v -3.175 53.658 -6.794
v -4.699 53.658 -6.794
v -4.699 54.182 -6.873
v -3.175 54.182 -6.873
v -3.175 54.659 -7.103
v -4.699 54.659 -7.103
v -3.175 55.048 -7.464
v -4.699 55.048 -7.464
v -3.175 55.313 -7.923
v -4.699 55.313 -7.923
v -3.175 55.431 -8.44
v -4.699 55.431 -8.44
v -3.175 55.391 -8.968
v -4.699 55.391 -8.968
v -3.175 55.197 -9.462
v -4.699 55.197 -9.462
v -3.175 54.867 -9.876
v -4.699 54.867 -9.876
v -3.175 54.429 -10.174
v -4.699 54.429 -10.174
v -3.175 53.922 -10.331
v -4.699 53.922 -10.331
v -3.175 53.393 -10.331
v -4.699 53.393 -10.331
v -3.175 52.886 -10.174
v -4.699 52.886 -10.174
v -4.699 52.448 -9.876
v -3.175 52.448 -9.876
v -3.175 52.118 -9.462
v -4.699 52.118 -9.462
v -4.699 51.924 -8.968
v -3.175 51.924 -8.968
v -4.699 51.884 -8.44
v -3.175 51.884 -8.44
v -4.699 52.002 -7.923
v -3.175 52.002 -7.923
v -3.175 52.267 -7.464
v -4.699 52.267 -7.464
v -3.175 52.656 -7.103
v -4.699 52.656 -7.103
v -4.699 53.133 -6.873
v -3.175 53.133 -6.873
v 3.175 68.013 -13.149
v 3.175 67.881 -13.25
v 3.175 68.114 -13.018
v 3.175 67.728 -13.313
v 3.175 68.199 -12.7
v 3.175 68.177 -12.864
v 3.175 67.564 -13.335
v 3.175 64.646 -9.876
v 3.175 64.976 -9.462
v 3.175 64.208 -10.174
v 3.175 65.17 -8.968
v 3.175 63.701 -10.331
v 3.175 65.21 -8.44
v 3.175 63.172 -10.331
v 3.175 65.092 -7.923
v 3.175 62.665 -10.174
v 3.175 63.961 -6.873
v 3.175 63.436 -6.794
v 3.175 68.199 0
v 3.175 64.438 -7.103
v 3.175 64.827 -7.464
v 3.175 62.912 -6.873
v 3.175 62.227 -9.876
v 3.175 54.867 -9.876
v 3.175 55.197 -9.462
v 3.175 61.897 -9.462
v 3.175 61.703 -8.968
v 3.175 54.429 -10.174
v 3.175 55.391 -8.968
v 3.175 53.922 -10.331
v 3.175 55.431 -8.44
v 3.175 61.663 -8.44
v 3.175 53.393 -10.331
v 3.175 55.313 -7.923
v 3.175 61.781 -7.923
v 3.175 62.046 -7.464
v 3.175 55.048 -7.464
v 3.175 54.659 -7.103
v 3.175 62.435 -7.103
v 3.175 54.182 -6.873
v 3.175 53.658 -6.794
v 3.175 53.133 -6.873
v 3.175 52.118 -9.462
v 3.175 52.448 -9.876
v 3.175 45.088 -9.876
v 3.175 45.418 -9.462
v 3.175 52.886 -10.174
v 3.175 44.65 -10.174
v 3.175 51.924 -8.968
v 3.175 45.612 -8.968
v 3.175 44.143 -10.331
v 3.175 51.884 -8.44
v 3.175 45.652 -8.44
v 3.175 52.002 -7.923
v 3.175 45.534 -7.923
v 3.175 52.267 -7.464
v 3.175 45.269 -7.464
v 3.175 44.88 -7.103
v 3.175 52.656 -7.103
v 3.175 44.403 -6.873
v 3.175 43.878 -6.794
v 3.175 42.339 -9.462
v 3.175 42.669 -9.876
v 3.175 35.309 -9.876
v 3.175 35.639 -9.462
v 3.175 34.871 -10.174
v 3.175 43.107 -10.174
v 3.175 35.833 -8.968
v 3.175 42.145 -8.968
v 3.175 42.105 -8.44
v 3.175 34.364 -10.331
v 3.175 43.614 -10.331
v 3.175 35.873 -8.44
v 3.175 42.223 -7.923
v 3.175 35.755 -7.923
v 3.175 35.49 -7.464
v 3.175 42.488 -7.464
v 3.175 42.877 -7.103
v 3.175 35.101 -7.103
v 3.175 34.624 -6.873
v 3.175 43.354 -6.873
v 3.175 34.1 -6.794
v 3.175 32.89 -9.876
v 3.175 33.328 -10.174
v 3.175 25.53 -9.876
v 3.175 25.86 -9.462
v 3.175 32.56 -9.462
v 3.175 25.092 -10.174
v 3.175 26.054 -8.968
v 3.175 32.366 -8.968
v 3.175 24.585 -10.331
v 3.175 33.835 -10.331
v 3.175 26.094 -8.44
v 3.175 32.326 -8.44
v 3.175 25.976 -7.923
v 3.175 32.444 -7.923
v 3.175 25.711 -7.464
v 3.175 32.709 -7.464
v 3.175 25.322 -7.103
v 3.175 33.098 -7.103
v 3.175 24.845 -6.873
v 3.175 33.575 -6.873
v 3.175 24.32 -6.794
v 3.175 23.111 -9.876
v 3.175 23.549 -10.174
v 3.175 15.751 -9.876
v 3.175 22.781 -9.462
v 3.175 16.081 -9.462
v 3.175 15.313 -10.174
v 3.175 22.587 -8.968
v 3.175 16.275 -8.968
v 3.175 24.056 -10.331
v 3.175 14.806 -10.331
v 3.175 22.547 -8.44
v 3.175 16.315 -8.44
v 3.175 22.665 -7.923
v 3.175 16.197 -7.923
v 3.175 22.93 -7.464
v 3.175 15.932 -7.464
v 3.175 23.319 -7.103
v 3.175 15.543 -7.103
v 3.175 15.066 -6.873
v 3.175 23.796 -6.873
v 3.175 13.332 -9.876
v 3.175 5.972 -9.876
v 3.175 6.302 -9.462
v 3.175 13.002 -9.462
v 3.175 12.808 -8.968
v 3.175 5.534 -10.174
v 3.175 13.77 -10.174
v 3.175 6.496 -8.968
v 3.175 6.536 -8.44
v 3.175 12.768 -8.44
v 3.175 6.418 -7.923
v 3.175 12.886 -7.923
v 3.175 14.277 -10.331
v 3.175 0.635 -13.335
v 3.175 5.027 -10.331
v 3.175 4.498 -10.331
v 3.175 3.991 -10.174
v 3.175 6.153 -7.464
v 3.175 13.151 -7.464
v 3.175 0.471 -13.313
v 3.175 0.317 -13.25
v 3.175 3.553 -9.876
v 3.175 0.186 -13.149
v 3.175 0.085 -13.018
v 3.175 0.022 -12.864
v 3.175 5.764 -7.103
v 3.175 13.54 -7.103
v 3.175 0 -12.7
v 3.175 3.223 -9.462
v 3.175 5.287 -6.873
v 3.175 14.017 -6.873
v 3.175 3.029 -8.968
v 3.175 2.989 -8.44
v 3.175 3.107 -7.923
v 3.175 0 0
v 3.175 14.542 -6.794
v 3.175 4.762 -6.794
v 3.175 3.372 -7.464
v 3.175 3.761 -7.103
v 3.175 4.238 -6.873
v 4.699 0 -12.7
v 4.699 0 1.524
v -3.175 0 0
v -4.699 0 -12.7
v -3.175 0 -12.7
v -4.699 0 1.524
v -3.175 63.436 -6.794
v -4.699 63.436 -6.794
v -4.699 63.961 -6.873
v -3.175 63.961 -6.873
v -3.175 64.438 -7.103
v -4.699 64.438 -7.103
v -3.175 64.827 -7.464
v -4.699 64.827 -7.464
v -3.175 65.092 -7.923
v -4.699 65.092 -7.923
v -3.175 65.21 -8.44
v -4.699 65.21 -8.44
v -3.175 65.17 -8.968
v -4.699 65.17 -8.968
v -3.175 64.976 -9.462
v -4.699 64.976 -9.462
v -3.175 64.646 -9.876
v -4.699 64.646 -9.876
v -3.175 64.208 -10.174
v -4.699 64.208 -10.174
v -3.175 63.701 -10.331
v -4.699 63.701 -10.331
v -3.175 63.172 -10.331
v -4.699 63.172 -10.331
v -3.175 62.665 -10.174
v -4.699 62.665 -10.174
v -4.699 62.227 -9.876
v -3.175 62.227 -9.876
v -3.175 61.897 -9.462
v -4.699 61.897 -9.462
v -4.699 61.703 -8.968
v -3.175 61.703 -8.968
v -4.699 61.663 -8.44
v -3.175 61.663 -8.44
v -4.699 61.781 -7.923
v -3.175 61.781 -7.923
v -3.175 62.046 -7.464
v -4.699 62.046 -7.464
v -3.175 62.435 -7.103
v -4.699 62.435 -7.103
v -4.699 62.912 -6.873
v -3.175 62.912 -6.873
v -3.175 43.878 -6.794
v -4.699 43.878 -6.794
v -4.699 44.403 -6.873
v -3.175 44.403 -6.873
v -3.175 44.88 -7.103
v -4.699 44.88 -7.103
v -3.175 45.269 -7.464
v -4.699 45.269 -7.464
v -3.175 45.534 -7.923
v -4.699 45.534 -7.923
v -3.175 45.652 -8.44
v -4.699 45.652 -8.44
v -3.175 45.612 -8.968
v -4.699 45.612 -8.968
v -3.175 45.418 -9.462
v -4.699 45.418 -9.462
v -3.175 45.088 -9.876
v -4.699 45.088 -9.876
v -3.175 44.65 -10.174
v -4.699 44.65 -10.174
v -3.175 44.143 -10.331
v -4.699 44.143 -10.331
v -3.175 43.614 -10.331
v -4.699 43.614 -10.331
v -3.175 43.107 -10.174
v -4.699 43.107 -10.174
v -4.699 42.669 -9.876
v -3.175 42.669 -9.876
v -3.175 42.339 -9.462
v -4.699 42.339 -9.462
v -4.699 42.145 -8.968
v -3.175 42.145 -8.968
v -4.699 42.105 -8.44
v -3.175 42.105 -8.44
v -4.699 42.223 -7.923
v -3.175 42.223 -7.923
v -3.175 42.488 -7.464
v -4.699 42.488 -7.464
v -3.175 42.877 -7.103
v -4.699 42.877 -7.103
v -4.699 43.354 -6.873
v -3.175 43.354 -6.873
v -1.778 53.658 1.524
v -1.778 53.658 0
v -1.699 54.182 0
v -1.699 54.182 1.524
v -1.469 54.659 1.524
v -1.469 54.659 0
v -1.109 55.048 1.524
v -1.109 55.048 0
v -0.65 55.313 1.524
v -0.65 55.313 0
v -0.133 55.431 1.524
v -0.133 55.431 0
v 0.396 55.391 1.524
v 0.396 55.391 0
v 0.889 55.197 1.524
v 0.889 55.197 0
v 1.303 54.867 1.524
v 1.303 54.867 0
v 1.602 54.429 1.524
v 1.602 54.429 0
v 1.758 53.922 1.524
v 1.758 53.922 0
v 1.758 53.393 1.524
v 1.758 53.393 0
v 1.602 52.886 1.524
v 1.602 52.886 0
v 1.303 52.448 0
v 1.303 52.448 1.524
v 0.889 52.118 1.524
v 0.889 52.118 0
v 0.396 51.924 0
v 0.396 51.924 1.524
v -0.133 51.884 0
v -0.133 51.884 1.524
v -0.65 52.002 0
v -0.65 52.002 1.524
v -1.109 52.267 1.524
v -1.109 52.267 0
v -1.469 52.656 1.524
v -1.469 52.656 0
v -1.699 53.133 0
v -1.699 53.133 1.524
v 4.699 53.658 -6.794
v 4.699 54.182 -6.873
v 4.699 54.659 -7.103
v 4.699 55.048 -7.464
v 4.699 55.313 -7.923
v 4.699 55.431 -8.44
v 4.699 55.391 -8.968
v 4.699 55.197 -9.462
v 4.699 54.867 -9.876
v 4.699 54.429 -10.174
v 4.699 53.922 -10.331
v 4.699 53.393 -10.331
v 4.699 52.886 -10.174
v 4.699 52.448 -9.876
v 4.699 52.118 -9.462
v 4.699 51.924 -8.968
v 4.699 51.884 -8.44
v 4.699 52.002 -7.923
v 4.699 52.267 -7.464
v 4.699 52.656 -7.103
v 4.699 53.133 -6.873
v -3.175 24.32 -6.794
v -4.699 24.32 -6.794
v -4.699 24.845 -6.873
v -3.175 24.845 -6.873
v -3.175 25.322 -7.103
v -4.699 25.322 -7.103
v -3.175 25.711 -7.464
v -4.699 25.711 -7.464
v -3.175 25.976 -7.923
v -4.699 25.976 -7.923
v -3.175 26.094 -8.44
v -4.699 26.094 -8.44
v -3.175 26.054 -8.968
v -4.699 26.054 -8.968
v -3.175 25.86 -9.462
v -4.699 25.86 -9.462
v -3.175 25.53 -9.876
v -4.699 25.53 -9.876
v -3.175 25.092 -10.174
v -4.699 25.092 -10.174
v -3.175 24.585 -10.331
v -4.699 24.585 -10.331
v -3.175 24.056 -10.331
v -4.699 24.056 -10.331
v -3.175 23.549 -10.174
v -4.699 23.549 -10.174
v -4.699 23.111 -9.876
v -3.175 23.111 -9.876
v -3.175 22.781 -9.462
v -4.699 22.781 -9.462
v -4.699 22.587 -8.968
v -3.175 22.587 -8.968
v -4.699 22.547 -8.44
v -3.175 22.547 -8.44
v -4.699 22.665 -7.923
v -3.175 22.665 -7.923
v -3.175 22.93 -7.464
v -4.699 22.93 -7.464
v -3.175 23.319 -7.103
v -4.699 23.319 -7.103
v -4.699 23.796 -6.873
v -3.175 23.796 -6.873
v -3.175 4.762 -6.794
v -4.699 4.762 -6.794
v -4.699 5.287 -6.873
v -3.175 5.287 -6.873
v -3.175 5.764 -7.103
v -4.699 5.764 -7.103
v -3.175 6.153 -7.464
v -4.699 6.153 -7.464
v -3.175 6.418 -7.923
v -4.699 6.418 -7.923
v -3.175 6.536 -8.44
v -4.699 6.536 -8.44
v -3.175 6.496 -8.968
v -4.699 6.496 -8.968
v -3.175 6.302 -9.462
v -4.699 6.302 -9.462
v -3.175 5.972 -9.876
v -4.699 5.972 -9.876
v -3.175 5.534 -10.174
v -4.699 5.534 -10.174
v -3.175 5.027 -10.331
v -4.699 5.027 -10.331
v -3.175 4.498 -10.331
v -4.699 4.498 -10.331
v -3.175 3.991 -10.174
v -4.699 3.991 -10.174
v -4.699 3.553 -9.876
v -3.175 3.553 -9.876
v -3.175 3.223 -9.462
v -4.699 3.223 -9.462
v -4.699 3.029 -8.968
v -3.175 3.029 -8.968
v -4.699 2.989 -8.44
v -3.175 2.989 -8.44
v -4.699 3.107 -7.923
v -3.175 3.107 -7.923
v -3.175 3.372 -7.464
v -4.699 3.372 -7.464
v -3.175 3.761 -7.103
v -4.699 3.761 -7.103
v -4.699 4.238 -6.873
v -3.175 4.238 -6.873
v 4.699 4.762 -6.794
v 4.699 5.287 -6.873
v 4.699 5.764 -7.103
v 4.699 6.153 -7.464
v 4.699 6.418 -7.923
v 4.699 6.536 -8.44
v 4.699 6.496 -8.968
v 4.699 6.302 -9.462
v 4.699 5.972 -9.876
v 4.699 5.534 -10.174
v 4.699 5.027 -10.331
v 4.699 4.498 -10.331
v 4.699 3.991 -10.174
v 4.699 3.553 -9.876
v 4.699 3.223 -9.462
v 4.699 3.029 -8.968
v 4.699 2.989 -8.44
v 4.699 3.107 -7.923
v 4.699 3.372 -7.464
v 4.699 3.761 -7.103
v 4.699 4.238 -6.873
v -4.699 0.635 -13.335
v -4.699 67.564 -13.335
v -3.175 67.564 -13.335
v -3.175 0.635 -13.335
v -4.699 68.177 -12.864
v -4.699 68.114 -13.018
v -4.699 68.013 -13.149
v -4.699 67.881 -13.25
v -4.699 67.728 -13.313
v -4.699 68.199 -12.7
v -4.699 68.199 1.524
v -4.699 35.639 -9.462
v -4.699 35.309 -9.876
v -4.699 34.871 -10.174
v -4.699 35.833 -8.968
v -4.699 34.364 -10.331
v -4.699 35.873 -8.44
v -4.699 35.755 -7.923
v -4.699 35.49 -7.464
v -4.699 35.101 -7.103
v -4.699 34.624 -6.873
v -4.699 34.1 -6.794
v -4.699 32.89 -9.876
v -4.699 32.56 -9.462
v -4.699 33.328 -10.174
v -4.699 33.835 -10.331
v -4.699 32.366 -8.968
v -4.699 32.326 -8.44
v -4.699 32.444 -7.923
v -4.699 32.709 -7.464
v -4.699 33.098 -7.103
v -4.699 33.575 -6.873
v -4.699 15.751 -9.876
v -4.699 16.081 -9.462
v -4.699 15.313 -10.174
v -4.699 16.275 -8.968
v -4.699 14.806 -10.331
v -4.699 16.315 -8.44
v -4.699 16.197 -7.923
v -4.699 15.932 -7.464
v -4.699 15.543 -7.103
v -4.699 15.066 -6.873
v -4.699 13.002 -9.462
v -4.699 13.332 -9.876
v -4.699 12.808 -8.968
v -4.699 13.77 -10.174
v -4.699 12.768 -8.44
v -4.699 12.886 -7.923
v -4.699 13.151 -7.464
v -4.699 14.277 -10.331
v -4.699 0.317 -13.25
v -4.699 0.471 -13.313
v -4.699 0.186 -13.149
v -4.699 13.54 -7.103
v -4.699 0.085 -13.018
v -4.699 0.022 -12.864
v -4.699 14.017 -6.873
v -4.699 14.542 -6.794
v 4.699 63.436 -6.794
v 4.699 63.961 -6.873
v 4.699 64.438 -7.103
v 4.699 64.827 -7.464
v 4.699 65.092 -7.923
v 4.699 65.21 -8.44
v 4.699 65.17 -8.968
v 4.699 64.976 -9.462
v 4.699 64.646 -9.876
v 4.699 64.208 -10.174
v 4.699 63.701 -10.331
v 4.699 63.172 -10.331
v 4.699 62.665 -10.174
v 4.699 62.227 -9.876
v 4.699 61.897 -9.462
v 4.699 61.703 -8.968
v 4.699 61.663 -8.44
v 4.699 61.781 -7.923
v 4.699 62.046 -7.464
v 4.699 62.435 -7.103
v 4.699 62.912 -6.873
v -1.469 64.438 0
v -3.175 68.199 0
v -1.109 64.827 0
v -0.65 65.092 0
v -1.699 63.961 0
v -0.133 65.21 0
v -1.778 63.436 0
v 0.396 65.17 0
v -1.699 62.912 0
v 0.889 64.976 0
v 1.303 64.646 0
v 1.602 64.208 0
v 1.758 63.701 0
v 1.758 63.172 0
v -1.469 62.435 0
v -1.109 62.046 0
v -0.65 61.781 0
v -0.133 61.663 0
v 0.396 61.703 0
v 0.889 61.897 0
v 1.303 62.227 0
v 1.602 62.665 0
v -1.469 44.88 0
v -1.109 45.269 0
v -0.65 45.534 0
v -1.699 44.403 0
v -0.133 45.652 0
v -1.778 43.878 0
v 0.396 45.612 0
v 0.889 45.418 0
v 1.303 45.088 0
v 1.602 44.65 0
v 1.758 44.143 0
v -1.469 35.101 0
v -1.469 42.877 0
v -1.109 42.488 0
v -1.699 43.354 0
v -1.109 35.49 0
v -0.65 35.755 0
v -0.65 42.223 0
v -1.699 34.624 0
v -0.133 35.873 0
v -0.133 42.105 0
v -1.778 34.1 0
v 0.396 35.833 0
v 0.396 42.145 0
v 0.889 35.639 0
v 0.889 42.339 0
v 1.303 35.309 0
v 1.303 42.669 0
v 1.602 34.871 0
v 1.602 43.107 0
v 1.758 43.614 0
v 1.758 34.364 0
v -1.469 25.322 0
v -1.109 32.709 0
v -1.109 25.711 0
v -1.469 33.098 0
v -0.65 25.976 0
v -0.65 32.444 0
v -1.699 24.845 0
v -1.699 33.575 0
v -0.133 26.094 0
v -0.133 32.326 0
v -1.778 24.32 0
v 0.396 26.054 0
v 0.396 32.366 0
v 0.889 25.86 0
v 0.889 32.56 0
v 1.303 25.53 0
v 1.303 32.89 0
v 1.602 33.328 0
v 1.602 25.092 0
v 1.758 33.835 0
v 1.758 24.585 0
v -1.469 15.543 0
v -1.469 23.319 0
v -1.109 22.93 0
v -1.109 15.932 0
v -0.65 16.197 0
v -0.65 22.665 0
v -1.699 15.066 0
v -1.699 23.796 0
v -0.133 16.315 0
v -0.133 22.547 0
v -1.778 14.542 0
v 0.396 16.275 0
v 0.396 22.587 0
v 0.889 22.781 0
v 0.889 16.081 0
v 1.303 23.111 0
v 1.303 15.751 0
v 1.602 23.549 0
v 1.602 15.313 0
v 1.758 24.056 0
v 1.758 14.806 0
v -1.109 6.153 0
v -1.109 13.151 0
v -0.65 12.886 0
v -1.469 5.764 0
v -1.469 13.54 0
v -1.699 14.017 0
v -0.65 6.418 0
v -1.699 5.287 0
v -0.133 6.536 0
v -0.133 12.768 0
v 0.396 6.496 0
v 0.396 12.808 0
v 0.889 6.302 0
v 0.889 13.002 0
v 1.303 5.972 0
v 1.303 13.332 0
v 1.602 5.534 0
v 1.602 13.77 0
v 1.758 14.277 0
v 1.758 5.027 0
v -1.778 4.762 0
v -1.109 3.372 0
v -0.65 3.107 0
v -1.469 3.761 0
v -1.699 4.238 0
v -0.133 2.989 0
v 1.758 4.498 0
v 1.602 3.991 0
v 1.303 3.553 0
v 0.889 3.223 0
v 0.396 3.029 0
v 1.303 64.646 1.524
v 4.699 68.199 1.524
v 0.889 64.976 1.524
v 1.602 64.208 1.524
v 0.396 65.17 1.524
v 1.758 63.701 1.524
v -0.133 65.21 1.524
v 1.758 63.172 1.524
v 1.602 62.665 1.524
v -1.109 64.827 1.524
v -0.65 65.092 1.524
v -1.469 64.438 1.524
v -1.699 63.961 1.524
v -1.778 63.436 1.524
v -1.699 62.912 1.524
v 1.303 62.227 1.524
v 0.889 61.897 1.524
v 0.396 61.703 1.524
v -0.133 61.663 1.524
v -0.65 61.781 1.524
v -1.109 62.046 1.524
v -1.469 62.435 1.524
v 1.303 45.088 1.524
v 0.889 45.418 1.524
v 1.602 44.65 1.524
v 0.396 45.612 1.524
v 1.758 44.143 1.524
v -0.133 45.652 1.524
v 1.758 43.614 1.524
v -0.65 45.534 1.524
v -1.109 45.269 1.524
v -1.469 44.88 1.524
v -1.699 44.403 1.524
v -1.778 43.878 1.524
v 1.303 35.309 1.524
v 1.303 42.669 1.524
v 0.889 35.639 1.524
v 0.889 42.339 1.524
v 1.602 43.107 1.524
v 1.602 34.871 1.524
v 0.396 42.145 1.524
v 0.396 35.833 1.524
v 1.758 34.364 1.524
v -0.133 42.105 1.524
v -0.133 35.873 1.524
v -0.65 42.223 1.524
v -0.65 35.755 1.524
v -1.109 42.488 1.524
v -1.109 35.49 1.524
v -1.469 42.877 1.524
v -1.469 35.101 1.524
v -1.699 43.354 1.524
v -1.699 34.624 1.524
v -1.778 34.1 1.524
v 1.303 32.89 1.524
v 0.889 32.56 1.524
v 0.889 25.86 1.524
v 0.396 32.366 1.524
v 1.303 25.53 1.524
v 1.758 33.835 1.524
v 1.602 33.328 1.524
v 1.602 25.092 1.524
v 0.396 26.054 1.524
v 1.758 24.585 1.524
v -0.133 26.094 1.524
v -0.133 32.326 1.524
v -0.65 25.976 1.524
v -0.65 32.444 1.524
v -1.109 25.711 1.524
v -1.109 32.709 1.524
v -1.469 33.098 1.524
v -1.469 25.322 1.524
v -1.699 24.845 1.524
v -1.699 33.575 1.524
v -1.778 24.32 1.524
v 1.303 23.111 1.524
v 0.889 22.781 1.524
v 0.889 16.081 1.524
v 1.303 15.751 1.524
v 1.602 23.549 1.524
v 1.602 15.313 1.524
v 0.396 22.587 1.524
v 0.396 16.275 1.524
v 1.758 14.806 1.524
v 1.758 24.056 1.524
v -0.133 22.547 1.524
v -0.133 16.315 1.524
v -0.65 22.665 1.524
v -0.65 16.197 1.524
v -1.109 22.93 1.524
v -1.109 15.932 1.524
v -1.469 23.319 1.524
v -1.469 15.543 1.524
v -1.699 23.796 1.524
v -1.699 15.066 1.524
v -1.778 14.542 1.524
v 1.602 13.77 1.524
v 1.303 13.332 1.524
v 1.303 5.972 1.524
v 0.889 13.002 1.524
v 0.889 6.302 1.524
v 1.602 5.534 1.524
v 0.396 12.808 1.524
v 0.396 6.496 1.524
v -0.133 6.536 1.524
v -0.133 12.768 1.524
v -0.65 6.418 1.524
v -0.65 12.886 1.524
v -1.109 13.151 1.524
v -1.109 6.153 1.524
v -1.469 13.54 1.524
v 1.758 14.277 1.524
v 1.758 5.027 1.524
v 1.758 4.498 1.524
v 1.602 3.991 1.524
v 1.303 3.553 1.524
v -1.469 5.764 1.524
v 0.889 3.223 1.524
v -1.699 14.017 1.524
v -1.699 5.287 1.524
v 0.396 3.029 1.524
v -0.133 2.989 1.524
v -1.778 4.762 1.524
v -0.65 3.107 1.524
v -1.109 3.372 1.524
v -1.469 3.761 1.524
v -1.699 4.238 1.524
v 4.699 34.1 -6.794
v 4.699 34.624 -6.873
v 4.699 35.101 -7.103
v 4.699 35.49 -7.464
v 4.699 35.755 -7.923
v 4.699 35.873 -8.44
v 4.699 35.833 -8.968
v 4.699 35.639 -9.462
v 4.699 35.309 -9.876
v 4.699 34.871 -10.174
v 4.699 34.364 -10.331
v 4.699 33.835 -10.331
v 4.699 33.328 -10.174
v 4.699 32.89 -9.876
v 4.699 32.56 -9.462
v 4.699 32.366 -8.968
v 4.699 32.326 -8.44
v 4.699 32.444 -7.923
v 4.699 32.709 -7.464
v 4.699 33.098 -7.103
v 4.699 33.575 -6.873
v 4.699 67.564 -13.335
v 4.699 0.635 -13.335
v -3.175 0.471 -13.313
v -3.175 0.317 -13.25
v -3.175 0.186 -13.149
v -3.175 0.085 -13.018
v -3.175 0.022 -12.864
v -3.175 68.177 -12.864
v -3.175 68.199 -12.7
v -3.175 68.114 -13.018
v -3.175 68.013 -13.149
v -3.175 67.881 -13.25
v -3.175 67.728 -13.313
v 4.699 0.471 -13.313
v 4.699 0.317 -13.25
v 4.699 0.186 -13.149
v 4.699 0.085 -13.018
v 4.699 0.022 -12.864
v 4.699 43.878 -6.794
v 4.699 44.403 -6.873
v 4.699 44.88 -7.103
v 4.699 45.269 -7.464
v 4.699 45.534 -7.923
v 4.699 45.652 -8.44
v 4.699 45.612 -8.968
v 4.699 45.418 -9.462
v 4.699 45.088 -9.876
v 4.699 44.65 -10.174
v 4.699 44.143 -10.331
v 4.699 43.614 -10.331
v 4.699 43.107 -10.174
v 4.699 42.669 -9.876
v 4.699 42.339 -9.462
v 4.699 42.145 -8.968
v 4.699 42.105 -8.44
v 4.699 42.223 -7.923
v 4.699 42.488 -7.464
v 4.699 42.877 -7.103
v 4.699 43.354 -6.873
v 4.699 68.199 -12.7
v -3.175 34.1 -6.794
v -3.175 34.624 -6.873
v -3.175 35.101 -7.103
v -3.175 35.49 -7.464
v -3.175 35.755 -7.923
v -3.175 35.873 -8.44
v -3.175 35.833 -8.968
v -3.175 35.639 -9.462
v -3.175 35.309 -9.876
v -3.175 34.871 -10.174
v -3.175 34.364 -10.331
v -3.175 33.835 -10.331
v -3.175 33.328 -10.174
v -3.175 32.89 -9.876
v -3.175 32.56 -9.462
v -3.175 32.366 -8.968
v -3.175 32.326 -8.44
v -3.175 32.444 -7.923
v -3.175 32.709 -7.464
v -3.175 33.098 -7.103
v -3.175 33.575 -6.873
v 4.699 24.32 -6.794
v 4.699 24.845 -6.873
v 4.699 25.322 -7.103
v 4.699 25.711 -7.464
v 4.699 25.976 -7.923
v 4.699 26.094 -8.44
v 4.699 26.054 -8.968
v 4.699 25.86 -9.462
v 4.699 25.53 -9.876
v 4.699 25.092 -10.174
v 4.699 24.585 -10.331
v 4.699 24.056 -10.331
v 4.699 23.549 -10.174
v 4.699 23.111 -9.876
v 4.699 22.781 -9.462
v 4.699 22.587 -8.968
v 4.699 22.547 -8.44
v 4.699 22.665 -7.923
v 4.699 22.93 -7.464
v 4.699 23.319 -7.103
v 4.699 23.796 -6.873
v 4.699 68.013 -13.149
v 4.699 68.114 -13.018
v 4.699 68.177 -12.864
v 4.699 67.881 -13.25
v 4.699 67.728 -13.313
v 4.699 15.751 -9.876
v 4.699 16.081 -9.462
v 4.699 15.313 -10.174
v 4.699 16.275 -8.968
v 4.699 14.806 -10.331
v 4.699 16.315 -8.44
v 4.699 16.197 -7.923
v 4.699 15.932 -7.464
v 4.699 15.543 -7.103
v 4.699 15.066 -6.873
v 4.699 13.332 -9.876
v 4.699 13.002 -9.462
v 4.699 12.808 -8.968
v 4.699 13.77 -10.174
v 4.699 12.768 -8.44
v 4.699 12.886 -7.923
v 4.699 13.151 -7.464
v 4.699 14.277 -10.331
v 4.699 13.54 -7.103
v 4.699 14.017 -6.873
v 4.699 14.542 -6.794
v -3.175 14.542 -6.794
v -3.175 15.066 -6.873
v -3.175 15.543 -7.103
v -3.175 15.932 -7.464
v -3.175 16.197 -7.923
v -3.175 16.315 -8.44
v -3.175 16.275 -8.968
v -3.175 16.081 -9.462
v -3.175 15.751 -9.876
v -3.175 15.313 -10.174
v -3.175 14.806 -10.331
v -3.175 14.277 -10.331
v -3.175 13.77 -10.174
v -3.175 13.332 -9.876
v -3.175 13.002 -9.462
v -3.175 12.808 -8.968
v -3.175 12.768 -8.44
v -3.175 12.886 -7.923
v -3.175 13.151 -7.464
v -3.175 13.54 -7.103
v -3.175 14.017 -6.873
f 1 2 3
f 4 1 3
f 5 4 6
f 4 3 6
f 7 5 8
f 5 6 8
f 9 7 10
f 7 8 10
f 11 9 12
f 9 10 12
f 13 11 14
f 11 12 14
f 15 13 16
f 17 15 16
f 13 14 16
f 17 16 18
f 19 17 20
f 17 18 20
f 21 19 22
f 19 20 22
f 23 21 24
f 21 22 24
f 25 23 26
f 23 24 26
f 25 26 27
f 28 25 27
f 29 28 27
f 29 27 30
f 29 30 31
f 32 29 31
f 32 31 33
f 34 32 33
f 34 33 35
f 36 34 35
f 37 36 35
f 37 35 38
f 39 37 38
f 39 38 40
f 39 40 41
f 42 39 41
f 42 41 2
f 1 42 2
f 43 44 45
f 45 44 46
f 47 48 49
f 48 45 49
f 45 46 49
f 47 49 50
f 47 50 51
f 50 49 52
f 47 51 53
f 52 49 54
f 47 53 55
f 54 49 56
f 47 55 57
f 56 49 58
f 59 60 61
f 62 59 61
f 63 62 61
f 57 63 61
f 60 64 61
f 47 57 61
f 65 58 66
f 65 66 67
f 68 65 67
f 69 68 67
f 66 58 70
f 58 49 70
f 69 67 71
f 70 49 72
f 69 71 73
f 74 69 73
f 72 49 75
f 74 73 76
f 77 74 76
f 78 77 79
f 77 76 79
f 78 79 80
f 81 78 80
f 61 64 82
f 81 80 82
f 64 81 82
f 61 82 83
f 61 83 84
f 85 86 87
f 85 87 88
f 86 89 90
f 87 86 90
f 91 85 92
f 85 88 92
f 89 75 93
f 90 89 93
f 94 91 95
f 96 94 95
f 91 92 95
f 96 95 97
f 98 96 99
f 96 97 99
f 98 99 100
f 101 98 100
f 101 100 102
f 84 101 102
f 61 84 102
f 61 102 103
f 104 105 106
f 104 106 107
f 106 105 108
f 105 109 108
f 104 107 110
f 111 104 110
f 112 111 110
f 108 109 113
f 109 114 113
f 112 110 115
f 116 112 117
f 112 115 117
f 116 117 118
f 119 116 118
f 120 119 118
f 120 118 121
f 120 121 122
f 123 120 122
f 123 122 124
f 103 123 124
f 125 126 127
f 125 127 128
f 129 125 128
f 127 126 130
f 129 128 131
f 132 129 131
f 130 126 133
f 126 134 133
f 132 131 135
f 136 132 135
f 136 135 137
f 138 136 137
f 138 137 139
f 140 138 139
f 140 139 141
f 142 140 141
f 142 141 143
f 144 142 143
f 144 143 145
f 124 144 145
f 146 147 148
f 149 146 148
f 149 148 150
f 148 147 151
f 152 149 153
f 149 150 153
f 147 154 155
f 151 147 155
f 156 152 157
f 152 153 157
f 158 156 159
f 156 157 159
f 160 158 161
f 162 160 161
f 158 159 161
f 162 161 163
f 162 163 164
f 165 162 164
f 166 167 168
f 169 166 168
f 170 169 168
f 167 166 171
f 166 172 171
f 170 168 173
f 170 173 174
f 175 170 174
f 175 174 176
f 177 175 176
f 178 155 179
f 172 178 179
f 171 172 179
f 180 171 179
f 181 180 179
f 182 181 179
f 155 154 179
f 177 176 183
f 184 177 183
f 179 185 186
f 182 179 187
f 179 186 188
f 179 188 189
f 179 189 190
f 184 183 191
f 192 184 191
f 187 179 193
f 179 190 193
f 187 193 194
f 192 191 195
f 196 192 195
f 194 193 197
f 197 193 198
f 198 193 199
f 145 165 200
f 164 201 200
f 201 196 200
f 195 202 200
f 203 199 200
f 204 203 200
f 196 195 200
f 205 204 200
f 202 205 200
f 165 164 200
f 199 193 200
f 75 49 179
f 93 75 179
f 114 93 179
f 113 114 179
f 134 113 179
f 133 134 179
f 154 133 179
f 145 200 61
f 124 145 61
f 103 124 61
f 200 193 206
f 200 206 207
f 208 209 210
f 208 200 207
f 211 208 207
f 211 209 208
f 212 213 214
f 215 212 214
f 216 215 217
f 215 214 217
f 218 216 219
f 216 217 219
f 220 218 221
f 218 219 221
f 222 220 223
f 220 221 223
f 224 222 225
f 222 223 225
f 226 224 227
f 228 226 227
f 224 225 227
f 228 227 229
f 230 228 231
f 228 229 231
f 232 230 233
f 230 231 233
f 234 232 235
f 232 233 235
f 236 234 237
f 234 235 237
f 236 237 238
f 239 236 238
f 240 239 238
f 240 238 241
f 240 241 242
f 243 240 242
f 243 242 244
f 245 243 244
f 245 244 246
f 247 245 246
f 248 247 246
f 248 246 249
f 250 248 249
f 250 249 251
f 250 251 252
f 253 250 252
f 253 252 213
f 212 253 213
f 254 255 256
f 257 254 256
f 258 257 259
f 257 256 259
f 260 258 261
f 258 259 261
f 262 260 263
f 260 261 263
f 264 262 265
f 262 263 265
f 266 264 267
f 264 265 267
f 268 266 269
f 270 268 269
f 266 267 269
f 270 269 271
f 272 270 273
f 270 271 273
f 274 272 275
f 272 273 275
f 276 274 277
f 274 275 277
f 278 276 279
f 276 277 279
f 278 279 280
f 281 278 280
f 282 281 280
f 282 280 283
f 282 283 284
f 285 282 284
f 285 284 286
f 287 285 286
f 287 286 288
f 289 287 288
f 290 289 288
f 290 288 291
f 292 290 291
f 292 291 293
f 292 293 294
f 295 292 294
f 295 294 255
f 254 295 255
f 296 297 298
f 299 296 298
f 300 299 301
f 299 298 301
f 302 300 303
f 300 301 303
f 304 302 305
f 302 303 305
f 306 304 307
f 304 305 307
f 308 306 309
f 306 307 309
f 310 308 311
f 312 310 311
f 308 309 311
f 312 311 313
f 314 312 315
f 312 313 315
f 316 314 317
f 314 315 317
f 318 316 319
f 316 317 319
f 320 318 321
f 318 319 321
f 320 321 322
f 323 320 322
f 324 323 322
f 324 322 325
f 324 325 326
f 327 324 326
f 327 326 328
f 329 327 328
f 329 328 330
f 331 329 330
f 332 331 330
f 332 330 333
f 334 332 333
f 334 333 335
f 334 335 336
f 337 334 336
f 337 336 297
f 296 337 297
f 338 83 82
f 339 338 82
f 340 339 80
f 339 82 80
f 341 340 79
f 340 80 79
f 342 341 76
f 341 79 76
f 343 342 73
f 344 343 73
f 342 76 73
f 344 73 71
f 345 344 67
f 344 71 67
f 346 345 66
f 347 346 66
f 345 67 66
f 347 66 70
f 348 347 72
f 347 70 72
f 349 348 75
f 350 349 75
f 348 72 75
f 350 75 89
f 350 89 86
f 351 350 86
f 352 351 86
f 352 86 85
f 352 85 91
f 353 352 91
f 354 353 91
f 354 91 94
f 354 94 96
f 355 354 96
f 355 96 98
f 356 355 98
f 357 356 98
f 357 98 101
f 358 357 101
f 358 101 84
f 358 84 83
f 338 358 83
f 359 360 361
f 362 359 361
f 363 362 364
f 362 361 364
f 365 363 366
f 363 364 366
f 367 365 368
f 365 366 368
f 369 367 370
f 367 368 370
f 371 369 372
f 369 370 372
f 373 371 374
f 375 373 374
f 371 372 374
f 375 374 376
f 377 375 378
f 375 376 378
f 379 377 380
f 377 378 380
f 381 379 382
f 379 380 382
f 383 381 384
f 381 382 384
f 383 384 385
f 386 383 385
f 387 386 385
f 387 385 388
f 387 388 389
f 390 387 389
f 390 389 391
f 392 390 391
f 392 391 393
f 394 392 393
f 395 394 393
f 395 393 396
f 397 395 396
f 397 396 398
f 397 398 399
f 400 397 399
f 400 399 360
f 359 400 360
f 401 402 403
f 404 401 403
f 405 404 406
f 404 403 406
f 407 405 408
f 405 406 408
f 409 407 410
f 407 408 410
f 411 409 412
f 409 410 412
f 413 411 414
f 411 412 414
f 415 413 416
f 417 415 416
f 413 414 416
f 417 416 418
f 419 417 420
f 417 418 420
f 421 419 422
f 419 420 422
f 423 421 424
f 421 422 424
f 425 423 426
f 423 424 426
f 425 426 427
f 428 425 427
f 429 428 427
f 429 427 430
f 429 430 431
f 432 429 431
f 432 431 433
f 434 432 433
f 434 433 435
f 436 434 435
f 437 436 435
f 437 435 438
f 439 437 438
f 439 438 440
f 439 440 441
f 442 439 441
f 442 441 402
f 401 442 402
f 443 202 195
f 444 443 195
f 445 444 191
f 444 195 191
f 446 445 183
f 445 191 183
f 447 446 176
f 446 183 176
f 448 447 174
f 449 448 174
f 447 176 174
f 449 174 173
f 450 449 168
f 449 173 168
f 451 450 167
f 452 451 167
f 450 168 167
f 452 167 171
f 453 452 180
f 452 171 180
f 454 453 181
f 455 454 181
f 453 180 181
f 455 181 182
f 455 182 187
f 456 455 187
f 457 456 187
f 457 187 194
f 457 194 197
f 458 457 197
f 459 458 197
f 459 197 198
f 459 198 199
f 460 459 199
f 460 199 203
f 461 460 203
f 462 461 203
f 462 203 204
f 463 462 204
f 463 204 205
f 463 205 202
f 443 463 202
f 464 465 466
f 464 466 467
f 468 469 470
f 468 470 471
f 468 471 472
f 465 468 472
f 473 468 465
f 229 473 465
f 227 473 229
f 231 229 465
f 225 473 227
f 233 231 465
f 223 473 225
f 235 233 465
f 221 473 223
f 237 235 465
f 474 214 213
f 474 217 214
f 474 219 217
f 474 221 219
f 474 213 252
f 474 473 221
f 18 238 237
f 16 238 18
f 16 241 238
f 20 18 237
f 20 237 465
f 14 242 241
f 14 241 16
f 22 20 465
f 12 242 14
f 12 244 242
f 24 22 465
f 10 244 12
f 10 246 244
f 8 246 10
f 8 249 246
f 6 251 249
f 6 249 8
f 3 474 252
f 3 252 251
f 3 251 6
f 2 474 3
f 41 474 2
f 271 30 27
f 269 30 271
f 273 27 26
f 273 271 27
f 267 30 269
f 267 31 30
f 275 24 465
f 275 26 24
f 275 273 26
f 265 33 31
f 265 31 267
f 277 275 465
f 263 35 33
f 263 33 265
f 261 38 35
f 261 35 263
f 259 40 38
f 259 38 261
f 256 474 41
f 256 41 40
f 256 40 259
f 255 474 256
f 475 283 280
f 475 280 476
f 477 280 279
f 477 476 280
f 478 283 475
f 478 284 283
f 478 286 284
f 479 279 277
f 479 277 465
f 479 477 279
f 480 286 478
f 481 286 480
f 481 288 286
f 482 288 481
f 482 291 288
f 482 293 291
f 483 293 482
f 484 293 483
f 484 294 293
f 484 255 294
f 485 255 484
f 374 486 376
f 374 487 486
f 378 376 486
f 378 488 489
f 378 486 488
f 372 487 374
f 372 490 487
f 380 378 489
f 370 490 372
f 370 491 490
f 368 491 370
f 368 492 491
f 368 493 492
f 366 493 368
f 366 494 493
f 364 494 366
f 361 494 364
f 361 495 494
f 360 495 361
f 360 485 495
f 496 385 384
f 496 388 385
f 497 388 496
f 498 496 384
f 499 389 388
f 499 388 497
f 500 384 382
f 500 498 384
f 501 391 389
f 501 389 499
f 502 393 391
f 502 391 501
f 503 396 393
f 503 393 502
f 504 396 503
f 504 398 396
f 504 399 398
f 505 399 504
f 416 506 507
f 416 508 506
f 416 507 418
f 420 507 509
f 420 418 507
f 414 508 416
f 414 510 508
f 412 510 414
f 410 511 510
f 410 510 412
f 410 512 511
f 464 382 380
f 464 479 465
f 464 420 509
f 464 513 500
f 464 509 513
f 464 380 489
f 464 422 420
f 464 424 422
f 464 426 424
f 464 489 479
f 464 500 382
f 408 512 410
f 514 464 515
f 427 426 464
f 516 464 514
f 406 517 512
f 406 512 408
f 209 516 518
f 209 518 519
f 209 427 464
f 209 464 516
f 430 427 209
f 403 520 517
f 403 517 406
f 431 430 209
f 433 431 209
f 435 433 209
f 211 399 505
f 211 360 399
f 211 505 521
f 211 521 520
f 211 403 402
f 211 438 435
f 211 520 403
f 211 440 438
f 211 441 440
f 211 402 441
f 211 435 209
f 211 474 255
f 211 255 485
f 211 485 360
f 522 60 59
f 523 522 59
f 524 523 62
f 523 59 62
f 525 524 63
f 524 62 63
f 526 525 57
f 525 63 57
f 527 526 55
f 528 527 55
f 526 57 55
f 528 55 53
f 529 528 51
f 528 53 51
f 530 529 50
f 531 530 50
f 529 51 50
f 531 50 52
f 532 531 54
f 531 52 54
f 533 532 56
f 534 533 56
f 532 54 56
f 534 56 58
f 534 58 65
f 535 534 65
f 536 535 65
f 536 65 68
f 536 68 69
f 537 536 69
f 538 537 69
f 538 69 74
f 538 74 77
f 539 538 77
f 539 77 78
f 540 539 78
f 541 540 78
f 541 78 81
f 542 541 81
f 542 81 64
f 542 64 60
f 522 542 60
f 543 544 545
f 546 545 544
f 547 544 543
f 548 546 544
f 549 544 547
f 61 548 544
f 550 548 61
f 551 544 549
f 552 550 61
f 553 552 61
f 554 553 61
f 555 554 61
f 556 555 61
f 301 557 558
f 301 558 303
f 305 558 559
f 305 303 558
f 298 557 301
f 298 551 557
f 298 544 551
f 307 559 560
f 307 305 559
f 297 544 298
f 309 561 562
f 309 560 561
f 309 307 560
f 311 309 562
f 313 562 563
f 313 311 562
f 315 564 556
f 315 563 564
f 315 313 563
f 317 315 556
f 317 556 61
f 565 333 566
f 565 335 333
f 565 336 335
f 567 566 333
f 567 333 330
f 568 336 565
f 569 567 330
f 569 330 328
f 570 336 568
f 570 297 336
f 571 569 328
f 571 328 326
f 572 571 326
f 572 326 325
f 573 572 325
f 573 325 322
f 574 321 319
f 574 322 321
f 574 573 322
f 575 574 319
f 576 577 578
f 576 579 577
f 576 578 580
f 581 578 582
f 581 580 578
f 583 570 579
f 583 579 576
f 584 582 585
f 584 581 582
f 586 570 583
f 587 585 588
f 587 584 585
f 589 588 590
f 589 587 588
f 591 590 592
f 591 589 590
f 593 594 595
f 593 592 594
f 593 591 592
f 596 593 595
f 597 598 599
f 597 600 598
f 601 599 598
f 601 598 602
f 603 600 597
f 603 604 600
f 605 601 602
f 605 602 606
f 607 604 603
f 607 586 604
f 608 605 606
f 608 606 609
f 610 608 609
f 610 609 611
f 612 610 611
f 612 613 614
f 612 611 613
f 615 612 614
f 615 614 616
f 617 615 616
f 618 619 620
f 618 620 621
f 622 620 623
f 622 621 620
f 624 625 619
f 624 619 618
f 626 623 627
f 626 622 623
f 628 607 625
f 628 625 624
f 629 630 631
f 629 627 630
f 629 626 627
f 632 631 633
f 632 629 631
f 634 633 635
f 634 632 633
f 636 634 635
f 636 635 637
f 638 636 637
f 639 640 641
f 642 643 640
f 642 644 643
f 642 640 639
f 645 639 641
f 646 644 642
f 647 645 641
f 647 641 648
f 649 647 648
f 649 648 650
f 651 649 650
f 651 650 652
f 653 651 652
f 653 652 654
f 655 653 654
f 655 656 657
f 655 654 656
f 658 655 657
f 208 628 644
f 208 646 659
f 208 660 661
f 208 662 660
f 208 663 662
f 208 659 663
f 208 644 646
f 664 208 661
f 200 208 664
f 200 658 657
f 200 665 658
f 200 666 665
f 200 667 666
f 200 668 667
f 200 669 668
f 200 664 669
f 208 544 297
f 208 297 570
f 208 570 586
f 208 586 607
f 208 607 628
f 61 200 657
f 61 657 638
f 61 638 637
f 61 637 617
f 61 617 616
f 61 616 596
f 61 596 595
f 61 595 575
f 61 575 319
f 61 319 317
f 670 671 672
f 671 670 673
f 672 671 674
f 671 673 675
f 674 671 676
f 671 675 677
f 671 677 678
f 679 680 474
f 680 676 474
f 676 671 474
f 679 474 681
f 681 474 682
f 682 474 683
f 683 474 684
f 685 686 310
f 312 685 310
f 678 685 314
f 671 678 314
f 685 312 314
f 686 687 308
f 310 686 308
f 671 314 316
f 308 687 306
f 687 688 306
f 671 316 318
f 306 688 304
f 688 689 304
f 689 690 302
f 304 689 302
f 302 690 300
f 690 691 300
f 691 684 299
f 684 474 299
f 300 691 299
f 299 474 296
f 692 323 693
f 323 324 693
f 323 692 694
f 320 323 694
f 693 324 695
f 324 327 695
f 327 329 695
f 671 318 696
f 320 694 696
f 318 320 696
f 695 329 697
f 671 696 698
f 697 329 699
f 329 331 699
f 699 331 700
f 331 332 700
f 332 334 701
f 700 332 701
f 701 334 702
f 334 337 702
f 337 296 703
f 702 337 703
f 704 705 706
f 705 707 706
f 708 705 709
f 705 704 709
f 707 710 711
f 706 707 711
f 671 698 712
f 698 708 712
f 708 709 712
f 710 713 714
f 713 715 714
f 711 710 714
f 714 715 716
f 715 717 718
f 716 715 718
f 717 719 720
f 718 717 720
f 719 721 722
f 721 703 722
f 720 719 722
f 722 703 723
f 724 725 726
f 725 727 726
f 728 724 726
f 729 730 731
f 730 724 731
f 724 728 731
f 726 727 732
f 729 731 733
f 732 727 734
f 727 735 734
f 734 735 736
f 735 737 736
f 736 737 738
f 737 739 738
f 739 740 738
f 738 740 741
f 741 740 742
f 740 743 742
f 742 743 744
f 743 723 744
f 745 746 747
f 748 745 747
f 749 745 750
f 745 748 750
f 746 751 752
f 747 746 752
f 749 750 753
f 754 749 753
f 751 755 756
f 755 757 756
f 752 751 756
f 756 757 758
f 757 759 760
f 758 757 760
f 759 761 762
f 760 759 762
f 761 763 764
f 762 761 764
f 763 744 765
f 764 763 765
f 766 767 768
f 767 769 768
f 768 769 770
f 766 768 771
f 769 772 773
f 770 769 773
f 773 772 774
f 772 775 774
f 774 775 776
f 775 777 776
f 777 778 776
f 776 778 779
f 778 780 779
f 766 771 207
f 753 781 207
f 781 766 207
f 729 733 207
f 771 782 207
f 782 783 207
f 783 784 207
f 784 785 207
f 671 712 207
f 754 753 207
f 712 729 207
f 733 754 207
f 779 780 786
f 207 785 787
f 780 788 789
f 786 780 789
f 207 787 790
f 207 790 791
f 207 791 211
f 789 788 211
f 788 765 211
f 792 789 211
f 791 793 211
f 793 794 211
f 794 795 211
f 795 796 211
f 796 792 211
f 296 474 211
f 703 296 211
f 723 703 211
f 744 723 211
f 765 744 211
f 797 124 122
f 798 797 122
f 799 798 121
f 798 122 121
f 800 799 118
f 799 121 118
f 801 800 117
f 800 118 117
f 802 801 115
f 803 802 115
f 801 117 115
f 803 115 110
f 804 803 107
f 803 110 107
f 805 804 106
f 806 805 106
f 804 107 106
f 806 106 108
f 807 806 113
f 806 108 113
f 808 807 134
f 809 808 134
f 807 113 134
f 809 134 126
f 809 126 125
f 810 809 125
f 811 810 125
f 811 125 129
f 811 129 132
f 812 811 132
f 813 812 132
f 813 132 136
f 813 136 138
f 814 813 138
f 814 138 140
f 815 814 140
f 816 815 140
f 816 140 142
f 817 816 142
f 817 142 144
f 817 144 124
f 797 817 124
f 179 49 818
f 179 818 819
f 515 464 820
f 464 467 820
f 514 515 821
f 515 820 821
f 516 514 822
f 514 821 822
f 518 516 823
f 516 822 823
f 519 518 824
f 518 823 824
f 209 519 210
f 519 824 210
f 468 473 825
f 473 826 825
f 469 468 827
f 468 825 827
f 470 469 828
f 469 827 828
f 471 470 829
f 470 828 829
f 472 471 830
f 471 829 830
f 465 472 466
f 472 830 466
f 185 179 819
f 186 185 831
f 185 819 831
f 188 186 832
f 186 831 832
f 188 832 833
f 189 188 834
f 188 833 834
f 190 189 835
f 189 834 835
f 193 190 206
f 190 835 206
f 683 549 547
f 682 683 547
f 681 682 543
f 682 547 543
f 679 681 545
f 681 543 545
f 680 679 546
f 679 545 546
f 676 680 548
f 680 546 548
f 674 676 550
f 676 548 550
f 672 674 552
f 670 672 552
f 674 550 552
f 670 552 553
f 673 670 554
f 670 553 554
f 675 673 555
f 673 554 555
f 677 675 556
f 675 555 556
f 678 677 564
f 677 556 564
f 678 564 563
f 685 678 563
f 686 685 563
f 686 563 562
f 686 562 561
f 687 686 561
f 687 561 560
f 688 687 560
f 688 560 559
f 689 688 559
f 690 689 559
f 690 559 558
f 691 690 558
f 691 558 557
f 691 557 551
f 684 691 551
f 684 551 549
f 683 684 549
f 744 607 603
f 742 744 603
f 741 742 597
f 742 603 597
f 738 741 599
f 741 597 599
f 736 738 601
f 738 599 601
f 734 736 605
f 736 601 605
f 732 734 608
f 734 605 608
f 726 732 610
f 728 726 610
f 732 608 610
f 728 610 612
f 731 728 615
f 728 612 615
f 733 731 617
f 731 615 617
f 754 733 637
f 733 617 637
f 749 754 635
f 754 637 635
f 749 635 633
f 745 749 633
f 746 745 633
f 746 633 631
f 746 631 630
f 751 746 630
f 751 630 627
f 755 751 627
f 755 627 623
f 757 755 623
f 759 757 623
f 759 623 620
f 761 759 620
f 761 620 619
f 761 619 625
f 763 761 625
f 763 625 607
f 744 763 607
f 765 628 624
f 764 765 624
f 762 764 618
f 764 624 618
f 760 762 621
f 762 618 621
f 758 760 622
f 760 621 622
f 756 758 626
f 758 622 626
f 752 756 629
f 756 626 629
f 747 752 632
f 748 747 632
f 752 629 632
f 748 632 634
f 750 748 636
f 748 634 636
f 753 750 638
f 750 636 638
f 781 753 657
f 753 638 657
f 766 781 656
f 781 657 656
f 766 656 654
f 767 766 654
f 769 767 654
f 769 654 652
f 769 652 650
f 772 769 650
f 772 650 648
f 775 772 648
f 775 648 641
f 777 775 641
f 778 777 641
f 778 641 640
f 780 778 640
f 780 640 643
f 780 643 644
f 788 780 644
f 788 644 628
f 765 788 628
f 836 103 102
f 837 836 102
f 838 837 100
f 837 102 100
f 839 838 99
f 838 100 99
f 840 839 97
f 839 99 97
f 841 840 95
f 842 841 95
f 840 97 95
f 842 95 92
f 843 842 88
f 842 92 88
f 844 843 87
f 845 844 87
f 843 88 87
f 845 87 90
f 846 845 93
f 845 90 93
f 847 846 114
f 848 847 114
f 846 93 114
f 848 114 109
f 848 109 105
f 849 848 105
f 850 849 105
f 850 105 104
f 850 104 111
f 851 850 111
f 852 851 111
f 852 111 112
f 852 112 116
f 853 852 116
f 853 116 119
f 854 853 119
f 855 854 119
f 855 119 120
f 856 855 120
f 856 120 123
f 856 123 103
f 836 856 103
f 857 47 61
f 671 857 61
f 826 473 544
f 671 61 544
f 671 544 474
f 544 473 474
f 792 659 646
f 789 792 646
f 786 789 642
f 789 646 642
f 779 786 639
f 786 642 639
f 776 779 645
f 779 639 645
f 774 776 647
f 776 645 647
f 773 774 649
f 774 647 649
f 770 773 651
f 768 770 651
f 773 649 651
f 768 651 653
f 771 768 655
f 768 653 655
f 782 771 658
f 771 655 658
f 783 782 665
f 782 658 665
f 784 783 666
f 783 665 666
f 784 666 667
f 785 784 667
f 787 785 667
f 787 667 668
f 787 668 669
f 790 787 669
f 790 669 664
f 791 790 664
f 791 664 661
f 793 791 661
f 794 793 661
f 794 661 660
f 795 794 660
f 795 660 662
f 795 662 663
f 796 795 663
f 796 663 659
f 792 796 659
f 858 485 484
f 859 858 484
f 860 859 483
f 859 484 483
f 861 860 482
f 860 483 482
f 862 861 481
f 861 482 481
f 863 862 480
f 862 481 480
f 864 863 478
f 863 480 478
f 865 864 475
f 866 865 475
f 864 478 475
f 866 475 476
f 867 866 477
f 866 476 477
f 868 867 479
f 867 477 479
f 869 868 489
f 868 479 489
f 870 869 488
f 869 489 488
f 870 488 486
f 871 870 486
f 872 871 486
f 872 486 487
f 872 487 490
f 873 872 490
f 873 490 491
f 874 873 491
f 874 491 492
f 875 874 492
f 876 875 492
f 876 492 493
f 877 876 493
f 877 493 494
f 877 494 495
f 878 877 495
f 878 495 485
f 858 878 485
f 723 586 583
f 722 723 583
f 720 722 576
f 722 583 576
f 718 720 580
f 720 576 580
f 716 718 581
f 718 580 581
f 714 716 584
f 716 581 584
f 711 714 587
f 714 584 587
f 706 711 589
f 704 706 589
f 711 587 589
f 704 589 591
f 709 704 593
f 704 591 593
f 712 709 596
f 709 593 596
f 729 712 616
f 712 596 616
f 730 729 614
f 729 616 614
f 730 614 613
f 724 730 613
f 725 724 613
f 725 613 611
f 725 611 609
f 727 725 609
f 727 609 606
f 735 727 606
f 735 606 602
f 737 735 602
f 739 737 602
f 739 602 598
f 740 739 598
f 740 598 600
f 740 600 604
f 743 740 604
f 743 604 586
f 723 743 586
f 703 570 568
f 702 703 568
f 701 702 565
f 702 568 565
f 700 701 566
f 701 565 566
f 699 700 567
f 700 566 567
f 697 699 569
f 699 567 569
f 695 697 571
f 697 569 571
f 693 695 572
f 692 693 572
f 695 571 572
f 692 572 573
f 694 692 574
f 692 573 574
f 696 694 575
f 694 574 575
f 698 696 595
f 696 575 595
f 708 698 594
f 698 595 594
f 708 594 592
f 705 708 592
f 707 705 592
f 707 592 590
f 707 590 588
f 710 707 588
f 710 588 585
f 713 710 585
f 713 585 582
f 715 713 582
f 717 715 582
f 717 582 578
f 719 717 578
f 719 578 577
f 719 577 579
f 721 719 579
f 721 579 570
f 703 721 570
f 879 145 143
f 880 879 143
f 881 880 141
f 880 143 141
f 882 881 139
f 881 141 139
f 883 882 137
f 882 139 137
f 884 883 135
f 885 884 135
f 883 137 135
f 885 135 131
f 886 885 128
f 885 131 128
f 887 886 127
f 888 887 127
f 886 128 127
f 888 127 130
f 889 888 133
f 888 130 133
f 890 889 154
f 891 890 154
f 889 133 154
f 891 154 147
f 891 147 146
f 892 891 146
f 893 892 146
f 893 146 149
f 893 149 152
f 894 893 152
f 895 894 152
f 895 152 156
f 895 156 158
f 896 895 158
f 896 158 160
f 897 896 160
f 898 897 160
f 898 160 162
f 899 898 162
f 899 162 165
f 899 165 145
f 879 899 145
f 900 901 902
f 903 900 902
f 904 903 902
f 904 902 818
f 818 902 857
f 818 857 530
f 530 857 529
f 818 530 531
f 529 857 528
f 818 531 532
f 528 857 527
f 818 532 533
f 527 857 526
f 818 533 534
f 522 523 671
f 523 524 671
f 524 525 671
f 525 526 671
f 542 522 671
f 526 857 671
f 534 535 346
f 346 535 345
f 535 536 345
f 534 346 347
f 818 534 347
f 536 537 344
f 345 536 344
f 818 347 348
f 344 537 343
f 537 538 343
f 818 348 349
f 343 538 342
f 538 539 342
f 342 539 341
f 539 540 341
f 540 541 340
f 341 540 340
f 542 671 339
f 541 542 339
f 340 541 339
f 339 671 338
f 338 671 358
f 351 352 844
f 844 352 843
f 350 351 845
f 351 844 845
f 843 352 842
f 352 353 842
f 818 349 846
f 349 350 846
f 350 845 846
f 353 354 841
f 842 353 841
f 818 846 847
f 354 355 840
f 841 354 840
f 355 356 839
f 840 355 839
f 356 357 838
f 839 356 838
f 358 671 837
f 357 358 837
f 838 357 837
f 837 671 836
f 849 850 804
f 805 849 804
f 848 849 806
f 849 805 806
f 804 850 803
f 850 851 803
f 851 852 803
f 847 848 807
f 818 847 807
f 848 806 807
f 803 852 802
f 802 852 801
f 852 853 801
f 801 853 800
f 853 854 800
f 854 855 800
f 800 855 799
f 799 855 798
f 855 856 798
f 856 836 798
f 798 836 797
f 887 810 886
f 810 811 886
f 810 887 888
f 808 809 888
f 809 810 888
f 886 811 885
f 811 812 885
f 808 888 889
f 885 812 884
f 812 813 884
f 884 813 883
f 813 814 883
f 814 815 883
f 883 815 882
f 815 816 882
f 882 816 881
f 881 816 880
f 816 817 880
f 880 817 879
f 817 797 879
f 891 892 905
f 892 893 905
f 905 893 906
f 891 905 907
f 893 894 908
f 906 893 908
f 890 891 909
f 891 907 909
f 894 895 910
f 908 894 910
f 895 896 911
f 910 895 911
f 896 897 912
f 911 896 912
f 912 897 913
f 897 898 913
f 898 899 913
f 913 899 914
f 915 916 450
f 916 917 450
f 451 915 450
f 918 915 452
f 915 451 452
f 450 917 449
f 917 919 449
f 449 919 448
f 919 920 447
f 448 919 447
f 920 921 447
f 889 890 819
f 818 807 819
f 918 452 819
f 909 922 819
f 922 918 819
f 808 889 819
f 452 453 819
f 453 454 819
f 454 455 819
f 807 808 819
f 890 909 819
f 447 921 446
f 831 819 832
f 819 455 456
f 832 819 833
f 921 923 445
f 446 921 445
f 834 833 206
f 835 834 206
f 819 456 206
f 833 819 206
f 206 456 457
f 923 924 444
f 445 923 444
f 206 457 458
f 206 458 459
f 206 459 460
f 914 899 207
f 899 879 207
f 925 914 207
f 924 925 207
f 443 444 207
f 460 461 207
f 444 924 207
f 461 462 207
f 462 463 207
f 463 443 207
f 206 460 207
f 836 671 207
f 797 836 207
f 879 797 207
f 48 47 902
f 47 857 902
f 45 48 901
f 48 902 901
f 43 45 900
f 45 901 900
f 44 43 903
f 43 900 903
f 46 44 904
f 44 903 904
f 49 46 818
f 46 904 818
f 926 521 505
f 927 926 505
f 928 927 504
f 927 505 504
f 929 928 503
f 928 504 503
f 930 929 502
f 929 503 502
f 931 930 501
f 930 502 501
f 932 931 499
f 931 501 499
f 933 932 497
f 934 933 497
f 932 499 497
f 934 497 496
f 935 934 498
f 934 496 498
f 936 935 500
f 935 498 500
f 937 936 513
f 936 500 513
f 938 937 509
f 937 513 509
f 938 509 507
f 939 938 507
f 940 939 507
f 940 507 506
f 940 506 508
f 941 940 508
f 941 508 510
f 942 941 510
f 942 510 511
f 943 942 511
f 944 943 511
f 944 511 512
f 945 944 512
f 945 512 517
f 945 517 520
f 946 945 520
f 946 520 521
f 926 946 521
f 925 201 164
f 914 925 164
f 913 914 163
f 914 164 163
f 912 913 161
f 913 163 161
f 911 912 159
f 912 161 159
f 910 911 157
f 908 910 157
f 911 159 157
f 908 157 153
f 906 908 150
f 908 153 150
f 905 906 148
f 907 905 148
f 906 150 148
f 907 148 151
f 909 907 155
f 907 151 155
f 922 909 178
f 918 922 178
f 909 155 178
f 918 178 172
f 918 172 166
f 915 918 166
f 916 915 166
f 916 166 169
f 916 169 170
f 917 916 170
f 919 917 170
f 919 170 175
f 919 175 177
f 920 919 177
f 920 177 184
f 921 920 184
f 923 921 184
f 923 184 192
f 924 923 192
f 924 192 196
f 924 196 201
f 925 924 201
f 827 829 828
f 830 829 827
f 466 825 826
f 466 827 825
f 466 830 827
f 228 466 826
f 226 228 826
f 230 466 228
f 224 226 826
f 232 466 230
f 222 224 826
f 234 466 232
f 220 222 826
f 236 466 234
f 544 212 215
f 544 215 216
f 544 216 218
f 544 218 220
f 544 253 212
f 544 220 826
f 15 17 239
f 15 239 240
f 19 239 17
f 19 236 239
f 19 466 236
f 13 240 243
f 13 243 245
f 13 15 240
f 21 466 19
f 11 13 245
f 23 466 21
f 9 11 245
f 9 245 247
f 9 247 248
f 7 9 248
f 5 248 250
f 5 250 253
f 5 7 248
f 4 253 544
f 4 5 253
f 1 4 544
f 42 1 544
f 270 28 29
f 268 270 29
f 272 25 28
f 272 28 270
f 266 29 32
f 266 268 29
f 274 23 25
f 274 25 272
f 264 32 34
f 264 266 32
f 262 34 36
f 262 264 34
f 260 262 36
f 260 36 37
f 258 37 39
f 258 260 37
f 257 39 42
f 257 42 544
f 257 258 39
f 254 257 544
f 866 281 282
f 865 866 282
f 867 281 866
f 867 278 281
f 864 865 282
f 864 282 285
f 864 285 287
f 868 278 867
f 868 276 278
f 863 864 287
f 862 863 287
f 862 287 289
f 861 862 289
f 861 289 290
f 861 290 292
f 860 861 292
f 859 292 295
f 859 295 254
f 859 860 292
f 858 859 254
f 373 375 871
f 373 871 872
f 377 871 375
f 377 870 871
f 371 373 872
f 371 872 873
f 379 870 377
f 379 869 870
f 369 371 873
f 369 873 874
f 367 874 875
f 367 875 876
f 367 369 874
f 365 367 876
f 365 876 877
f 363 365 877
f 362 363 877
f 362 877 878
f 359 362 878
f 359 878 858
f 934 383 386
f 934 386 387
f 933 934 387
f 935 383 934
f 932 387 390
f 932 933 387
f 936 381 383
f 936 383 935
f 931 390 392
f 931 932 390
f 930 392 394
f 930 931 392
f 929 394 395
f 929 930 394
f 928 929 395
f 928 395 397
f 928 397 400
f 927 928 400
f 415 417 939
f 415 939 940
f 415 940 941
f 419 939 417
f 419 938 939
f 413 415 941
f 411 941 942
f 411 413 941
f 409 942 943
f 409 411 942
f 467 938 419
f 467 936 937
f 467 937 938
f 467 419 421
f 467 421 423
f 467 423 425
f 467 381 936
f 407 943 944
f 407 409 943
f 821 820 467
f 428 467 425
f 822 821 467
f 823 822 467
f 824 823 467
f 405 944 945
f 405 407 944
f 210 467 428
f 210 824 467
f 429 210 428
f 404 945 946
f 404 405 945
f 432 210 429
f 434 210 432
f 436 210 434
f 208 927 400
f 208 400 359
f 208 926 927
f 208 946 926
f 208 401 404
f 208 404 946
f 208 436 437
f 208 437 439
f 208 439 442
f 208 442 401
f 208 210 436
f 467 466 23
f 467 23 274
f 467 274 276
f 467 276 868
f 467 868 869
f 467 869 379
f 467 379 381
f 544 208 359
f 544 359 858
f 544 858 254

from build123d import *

# Parameters (mm, degrees)
SKETCH1_W                 = 68.199
SKETCH1_H                 = 14.859
BOSS_EXTRUDE1_DEPTH       = 9.398
SKETCH2_W                 = 6.35
SKETCH2_H                 = 13.335
CUT_EXTRUDE1_DEPTH        = 70.649166736
F_5_CLEARANCE_HOLE1_D     = 3.556
F_5_CLEARANCE_HOLE1_DEPTH = 1.524
F_5_CLEARANCE_HOLE2_D     = 3.556
F_5_CLEARANCE_HOLE2_DEPTH = 14.859
F_5_CLEARANCE_HOLE3_D     = 3.556
FILLET1_R                 = 0.635


with BuildPart() as part:
    # Sketch1 → Boss-Extrude1 (new body)
    with BuildSketch(Plane(origin=(-4.699, 0, 0), x_dir=(0, -1, 0), z_dir=(-1, 0, 0))):
        with Locations((-34.0995, -5.9055)):
            Rectangle(SKETCH1_W, SKETCH1_H)
    extrude(amount=-BOSS_EXTRUDE1_DEPTH)

    # Sketch2 → Cut-Extrude1 (cut, through all)
    with BuildSketch(Plane.XZ):
        with Locations((0, -6.6675)):
            Rectangle(SKETCH2_W, SKETCH2_H)
    extrude(amount=-CUT_EXTRUDE1_DEPTH, mode=Mode.SUBTRACT)

    # #5 Clearance Hole1
    with Locations(Plane(origin=(4.699, 0, 0), x_dir=(0, 0, -1), z_dir=(1, 0, 0))):
        with Locations((8.5725, 53.6575), (8.5725, 63.4365), (8.5725, 43.8785), (8.5725, 34.0995), (8.5725, 24.3205), (8.5725, 14.5415), (8.5725, 4.7625)):
            Hole(F_5_CLEARANCE_HOLE1_D / 2, depth=F_5_CLEARANCE_HOLE1_DEPTH)

    # #5 Clearance Hole2
    with Locations(Plane.XY.offset(1.524)):
        with Locations((0, 53.6575), (0, 63.4365), (0, 43.8785), (0, 34.0995), (0, 24.3205), (0, 14.5415), (0, 4.7625)):
            Hole(F_5_CLEARANCE_HOLE2_D / 2, depth=F_5_CLEARANCE_HOLE2_DEPTH)

    # #5 Clearance Hole3 (through all)
    with Locations(Plane(origin=(-3.175, 0, 0), x_dir=(0, 0, -1), z_dir=(1, 0, 0))):
        with Locations((8.5725, 53.6575), (8.5725, 63.4365), (8.5725, 43.8785), (8.5725, 34.0995), (8.5725, 24.3205), (8.5725, 14.5415), (8.5725, 4.7625)):
            Hole(F_5_CLEARANCE_HOLE3_D / 2)

    # Fillet1
    fillet1_edges = [part.edges().sort_by_distance(p)[0] for p in [
        (-3.937, 68.199, -13.335),
        (-3.937, 0, -13.335),
        (3.937, 0, -13.335),
        (3.937, 68.199, -13.335),
    ]]
    fillet(fillet1_edges, radius=FILLET1_R)


solid = part.part
